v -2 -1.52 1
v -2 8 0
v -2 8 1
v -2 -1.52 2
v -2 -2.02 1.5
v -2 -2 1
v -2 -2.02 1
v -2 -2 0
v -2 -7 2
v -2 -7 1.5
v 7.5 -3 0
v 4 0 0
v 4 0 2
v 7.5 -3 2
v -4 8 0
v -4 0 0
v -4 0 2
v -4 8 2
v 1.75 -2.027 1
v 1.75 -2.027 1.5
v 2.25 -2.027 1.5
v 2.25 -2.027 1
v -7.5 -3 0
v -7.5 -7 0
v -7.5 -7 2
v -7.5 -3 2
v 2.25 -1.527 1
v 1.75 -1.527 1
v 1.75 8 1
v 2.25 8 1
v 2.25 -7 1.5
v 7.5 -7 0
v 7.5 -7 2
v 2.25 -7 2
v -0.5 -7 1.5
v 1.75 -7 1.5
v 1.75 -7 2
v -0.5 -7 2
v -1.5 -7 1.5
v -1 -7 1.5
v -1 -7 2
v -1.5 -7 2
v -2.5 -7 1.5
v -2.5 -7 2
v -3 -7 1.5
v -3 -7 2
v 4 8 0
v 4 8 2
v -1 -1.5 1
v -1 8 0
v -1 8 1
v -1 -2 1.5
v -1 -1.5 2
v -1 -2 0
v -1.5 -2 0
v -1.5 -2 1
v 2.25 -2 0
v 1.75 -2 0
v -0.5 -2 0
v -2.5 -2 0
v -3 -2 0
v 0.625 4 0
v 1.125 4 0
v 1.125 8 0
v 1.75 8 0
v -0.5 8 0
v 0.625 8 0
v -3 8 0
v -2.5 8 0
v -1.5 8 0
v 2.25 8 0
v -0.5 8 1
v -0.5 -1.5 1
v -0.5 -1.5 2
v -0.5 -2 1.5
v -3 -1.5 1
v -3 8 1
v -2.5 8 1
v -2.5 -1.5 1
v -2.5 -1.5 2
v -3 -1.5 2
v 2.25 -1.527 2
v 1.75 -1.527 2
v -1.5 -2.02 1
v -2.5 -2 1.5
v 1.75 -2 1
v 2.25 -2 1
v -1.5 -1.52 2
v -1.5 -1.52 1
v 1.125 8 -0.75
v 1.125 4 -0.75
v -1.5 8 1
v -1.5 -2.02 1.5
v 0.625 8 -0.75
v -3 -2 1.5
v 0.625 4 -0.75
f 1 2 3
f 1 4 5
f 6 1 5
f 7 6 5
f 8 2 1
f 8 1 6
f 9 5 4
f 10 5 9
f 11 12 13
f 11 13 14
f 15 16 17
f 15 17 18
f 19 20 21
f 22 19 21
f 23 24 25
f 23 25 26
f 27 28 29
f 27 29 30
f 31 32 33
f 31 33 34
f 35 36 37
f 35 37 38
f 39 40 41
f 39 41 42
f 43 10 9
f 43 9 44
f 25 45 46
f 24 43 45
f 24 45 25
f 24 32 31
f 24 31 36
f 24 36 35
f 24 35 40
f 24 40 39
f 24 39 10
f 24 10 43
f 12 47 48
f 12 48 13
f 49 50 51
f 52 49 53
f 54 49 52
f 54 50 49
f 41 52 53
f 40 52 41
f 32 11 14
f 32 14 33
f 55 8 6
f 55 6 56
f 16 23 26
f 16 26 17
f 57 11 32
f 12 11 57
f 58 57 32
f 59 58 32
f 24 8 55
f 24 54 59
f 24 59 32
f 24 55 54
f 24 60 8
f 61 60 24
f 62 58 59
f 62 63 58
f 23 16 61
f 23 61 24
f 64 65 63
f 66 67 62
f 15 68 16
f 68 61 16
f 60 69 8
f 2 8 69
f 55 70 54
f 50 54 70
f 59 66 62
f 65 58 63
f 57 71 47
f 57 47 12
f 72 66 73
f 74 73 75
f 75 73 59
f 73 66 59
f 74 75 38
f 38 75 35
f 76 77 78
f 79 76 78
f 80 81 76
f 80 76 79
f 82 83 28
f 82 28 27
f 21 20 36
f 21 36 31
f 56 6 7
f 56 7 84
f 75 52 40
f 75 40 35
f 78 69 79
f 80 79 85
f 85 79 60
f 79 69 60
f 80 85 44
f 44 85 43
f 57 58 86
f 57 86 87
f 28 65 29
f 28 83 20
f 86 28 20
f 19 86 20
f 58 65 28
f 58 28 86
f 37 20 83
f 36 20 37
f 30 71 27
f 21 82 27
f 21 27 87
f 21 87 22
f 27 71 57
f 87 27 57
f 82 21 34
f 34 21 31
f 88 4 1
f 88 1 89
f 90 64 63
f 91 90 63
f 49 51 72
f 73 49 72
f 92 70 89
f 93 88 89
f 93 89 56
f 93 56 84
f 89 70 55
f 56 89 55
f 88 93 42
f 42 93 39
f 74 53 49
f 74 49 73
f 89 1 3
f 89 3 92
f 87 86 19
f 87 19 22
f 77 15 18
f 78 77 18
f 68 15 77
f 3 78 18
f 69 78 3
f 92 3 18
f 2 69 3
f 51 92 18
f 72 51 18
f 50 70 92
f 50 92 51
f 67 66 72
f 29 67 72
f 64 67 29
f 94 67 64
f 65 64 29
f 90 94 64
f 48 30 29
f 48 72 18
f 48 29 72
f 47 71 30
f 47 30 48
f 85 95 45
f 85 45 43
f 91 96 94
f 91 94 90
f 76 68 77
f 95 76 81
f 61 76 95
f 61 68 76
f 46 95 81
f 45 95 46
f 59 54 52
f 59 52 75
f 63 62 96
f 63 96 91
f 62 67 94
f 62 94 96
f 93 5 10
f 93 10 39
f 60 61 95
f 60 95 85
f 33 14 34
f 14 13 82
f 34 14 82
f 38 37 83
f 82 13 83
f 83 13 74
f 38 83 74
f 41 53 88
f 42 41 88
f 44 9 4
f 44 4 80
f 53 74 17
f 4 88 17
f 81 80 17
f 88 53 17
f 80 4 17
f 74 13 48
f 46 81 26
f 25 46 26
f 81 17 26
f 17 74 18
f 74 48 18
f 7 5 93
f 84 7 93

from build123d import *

# Parameters (mm, degrees)
PAD_DEPTH       = 2
SKETCH001_W     = 0.5
SKETCH001_H     = 4
PAD001_DEPTH    = 0.75
SKETCH002_W     = 0.5
SKETCH002_H     = 10
POCKET_DEPTH    = 1
SKETCH003_W     = 0.5
SKETCH003_H     = 0.5
POCKET001_DEPTH = 1
SKETCH004_W     = 0.5
SKETCH004_H     = 5
POCKET002_DEPTH = 0.5


with BuildPart() as part:
    # Sketch → Pad (new body)
    with BuildSketch(Plane.XY):
        Polygon((-4, 8), (4, 8), (4, 0), (7.5, -3), (7.5, -7), (-7.5, -7), (-7.5, -3), (-4, 0), align=None)
    extrude(amount=PAD_DEPTH)

    # Sketch001 (on Face9 of Pad) → Pad001 (join)
    with BuildSketch(Plane(origin=(0, 0, 0), x_dir=(1, 0, 0), z_dir=(0, 0, -1))):
        with Locations((0.875, -6)):
            Rectangle(SKETCH001_W, SKETCH001_H)
    extrude(amount=PAD001_DEPTH)

    # Sketch002 (on Face4 of Pad001) → Pocket (cut)
    with BuildSketch(Plane(origin=(0, 0, 0), x_dir=(1, 0, 0), z_dir=(0, 0, -1))):
        with Locations((-2.75, -3)):
            Rectangle(SKETCH002_W, SKETCH002_H)
        with Locations((-1.75, -3)):
            Rectangle(SKETCH002_W, SKETCH002_H)
        with Locations((-0.75, -3)):
            Rectangle(SKETCH002_W, SKETCH002_H)
        with Locations((2, -3)):
            Rectangle(SKETCH002_W, SKETCH002_H)
    extrude(amount=-POCKET_DEPTH, mode=Mode.SUBTRACT)

    # Sketch003 (on Sketch) → Pocket001 (cut)
    with BuildSketch(Plane.XY.offset(2)):
        with Locations((-2.75, -1.75)):
            Rectangle(SKETCH003_W, SKETCH003_H)
        with Locations((-1.75, -1.770407)):
            Rectangle(SKETCH003_W, SKETCH003_H)
        with Locations((-0.75, -1.75)):
            Rectangle(SKETCH003_W, SKETCH003_H)
        with Locations((2, -1.777476)):
            Rectangle(SKETCH003_W, SKETCH003_H)
    extrude(amount=-POCKET001_DEPTH, mode=Mode.SUBTRACT)

    # Sketch004 (on Face5 of Pocket001) → Pocket002 (cut)
    with BuildSketch(Plane.XY.offset(2)):
        with Locations((-2.75, -4.5)):
            Rectangle(SKETCH004_W, SKETCH004_H)
        with Locations((-1.75, -4.5)):
            Rectangle(SKETCH004_W, SKETCH004_H)
        with Locations((-0.75, -4.5)):
            Rectangle(SKETCH004_W, SKETCH004_H)
        with Locations((2, -4.5)):
            Rectangle(SKETCH004_W, SKETCH004_H)
    extrude(amount=-POCKET002_DEPTH, mode=Mode.SUBTRACT)


solid = part.part
